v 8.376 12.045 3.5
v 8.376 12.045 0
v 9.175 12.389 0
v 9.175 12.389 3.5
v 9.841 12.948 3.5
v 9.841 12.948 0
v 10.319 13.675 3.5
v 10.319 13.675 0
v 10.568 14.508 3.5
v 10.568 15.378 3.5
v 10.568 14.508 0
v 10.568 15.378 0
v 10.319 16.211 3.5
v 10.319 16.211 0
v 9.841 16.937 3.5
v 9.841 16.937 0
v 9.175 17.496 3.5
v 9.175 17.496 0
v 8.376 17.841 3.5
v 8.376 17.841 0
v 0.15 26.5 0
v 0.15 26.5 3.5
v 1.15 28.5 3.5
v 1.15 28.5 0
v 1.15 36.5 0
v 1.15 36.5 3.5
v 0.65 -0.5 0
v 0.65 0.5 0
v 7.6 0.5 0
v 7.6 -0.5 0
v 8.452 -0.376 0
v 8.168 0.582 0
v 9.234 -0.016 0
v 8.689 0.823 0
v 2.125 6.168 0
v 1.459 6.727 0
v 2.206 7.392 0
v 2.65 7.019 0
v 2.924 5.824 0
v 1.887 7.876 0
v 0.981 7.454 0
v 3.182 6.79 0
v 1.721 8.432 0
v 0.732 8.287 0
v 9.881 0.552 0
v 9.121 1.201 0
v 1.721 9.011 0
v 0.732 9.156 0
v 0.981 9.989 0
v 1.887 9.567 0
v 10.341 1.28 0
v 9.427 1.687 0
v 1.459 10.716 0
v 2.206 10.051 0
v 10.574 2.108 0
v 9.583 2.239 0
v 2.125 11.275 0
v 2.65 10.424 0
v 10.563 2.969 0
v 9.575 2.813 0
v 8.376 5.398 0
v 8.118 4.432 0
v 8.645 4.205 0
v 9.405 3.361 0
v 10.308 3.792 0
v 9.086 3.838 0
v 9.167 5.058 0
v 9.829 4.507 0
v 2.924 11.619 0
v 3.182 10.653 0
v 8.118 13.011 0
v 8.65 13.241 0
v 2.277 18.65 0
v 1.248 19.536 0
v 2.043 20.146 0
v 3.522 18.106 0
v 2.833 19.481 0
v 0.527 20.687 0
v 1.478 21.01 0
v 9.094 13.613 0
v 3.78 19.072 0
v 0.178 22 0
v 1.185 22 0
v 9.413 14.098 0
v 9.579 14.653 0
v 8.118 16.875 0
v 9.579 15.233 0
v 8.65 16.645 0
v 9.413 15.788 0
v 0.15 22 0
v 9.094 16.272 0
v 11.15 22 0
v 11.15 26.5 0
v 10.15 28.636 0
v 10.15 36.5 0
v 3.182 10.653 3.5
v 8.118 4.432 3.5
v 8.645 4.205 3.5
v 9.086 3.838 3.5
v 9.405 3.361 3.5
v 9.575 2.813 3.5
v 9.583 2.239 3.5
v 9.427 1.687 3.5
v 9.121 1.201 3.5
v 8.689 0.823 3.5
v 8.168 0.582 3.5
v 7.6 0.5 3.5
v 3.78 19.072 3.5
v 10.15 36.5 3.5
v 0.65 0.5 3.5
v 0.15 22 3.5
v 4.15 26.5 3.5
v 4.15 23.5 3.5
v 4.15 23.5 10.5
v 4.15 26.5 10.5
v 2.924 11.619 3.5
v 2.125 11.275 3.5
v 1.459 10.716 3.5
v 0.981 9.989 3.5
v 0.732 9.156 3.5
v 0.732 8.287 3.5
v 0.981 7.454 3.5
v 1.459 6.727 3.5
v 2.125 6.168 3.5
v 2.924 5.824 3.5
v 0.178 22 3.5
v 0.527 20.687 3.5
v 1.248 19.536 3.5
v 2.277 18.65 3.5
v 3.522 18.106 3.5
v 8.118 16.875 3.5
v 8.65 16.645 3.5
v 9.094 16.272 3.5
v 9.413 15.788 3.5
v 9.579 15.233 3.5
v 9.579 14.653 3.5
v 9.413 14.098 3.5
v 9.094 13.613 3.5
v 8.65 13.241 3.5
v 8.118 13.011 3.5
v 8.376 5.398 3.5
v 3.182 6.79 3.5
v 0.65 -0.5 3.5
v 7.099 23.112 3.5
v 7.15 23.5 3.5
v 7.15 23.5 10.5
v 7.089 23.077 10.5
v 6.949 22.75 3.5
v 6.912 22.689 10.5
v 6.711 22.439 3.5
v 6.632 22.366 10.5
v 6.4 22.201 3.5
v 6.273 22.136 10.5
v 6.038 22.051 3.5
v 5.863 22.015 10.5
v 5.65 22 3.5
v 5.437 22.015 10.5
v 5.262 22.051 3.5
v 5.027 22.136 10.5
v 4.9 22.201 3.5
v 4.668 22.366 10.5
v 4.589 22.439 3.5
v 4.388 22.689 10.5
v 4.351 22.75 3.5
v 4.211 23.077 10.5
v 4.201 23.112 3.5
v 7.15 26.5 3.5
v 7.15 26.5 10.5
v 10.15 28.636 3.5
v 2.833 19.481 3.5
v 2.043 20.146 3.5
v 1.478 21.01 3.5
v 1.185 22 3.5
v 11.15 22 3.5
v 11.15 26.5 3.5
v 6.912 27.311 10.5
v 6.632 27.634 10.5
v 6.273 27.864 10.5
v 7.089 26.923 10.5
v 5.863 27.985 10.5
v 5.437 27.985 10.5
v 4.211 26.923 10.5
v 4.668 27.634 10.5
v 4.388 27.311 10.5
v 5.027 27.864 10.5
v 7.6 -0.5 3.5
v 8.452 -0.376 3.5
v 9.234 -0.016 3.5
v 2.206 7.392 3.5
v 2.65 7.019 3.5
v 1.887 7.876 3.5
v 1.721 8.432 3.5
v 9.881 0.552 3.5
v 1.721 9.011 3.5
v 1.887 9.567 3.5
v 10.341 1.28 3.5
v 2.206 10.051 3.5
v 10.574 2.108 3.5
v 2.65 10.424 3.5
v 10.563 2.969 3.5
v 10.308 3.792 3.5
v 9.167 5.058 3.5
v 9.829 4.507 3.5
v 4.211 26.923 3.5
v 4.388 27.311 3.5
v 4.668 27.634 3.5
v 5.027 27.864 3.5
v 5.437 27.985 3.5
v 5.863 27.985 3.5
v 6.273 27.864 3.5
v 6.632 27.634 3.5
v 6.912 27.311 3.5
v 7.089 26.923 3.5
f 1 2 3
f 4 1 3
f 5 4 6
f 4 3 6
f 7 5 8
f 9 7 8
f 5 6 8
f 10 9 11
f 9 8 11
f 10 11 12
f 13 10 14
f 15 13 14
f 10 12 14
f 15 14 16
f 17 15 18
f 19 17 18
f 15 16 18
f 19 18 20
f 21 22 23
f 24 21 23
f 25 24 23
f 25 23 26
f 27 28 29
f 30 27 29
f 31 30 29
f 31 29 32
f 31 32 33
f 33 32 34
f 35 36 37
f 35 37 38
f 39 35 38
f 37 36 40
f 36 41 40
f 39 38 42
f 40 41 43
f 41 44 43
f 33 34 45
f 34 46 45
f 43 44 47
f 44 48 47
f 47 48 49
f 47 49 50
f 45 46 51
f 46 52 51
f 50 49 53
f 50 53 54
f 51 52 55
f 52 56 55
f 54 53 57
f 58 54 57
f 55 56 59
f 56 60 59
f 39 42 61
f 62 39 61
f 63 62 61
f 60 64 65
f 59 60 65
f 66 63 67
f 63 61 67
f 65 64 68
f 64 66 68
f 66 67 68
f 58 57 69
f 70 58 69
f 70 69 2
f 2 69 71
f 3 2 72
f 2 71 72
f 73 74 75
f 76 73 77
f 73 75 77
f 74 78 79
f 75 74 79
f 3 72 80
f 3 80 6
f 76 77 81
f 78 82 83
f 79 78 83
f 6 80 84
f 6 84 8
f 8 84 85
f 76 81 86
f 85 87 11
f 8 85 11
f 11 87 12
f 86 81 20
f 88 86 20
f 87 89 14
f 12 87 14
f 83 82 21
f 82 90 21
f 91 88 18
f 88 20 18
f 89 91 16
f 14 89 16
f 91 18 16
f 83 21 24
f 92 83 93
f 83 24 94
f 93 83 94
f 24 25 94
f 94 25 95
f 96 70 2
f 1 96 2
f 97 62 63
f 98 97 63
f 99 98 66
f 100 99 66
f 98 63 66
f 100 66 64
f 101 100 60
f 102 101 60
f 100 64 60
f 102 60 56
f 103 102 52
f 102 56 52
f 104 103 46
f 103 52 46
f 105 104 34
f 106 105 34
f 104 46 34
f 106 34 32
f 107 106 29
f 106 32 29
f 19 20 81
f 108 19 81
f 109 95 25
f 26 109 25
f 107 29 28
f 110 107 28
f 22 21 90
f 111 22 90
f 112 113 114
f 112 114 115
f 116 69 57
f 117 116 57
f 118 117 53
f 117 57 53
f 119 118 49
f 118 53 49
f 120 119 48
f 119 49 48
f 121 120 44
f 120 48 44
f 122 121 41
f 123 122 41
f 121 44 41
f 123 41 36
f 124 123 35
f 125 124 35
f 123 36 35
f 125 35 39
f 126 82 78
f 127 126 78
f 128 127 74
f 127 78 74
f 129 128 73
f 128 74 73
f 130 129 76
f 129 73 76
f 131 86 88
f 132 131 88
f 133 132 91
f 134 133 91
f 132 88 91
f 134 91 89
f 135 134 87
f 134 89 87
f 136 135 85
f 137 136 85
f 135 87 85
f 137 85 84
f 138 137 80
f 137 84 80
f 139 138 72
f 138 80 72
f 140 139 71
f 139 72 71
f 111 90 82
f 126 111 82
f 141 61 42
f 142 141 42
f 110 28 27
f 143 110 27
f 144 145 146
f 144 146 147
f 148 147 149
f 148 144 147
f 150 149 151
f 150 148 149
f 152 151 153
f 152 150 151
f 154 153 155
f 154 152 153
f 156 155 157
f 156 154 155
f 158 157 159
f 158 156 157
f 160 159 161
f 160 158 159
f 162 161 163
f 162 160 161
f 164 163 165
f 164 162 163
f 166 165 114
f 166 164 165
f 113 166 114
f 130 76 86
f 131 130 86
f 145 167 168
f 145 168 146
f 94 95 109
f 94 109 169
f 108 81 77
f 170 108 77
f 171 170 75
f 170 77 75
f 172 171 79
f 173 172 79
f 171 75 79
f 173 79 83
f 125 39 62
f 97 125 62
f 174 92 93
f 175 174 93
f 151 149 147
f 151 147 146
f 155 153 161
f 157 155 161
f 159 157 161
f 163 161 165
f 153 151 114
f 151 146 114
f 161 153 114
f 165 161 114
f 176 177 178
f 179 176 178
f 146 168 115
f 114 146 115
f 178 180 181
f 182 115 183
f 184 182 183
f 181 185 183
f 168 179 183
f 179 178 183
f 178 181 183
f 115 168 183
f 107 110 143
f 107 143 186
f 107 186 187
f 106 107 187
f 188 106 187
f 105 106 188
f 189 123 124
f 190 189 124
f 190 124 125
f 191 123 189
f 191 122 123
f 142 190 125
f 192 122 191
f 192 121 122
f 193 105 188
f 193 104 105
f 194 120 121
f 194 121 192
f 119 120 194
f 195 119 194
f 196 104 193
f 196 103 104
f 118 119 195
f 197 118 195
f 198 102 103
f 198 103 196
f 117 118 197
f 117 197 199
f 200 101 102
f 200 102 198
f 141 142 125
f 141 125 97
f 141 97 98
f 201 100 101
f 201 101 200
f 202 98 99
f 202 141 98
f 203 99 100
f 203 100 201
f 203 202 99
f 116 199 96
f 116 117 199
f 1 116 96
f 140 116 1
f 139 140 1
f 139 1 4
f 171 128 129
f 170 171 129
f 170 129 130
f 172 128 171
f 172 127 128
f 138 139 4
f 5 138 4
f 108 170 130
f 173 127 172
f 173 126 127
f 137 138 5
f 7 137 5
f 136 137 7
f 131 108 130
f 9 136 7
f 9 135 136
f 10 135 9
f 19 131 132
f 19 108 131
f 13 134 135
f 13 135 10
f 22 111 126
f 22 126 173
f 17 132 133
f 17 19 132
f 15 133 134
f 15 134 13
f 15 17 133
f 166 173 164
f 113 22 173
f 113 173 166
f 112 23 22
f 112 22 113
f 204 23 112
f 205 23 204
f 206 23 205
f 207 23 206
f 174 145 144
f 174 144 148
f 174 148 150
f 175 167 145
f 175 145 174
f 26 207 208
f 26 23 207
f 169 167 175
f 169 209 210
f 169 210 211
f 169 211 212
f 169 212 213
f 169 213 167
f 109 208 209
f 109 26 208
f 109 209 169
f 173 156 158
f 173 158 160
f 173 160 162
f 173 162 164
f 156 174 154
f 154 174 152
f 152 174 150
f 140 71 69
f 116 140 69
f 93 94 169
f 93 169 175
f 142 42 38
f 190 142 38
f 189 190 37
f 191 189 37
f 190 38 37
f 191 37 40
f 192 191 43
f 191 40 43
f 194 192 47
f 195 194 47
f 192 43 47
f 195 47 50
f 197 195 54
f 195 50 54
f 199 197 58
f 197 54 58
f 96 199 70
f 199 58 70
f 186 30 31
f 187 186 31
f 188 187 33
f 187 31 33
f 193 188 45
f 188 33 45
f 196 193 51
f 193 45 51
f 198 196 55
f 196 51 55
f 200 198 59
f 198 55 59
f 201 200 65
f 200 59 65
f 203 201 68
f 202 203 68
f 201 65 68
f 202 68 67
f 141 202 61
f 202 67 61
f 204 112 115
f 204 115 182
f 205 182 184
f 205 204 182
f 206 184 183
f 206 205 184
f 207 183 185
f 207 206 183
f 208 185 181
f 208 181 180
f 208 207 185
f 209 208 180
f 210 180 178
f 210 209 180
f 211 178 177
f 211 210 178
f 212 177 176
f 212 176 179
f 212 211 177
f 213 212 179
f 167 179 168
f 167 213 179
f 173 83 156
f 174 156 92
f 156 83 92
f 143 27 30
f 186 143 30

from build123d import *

# Parameters (mm, degrees)
EXTRUDE_THIN1_OUTLINE_W = 9
EXTRUDE_THIN1_OUTLINE_H = 12.5
EXTRUDE_THIN1_DEPTH     = 3.5
SKETCH1_3_W             = 10
SKETCH1_3_H             = 13.5
BOSS_EXTRUDE1_DEPTH     = 3.5
BOSS_EXTRUDE2_DEPTH     = 7
CUT_EXTRUDE1_DEPTH      = 39.801707437
CUT_EXTRUDE1_DEPTH_BACK = 39.801707437


# Read off the part's stored shape, not the designer's step: Extrude-Thin1
with BuildPart() as part:
    # Extrude-Thin1 outline → Extrude-Thin1 (new body)
    with BuildSketch(Plane.XY):
        with BuildLine():
            ThreePointArc((0.177562937, 22), (1.247898439, 19.536389911), (3.521526088, 18.106141657))
            Line((3.521526088, 18.106141657), (8.11763809, 16.874617158))
            ThreePointArc((8.11763809, 16.874617158), (9.6, 14.942765505), (8.11763809, 13.010913852))
            Line((8.11763809, 13.010913852), (2.923542865, 11.619160231))
            ThreePointArc((2.923542865, 11.619160231), (0.7, 8.721382753), (2.923542865, 5.823605274))
            Line((2.923542865, 5.823605274), (8.11763809, 4.431851653))
            ThreePointArc((8.11763809, 4.431851653), (9.582889723, 2.238947616), (7.6, 0.5))
            Line((7.6, 0.5), (0.65, 0.5))
            Line((0.65, 0.5), (0.65, -0.5))
            Line((0.65, -0.5), (7.6, -0.5))
            ThreePointArc((7.6, -0.5), (10.574334584, 2.108421424), (8.376457135, 5.397777479))
            Line((8.376457135, 5.397777479), (3.18236191, 6.7895311))
            ThreePointArc((3.18236191, 6.7895311), (1.7, 8.721382752), (3.18236191, 10.653234405))
            Line((3.18236191, 10.653234405), (8.376457135, 12.044988026))
            ThreePointArc((8.376457135, 12.044988026), (10.6, 14.942765505), (8.376457135, 17.840542984))
            Line((8.376457135, 17.840542984), (3.780345133, 19.072067483))
            ThreePointArc((3.780345133, 19.072067483), (2.042960507, 20.146152168), (1.185399159, 22))
            Line((1.185399159, 22), (11.15, 22))
            Line((11.15, 22), (11.15, 36.5))
            Line((11.15, 36.5), (0.15, 36.5))
            Line((0.15, 36.5), (0.15, 22))
            Line((0.15, 22), (0.177562937, 22))
        make_face()
        with Locations((5.65, 29.25)):
            Rectangle(EXTRUDE_THIN1_OUTLINE_W, EXTRUDE_THIN1_OUTLINE_H, mode=Mode.SUBTRACT)
    extrude(amount=EXTRUDE_THIN1_DEPTH)

    # Sketch1<3> → Boss-Extrude1 (add)
    with BuildSketch(Plane.XY):
        with Locations((5.65, 29.25)):
            Rectangle(SKETCH1_3_W, SKETCH1_3_H)
    extrude(amount=BOSS_EXTRUDE1_DEPTH)

    # Sketch2 → Boss-Extrude2 (add)
    with BuildSketch(Plane.XY.offset(3.5)):
        with BuildLine():
            Line((7.15, 26.5), (7.15, 23.5))
            ThreePointArc((7.15, 23.5), (5.65, 22), (4.15, 23.5))
            Line((4.15, 23.5), (4.15, 26.5))
            ThreePointArc((4.15, 26.5), (5.65, 28), (7.15, 26.5))
        make_face()
    extrude(amount=BOSS_EXTRUDE2_DEPTH)

    # Sketch3 → Cut-Extrude1 (cut, two sides: drawn at the far end of the back side and taken through both)
    with BuildSketch(Plane.XY.offset(3.5).offset(-CUT_EXTRUDE1_DEPTH_BACK)):
        Polygon((0.15, 26.5), (1.15, 28.5), (1.15, 36.7), (10.15, 36.7), (10.15, 28.636121044), (11.15, 26.5), (15.293937853, 34.999866887), (13.289839187, 39.280864223), (-0.624731021, 39.280864223), (-5.238216118, 36.366540163), align=None)
    extrude(amount=CUT_EXTRUDE1_DEPTH + CUT_EXTRUDE1_DEPTH_BACK, mode=Mode.SUBTRACT)


solid = part.part
